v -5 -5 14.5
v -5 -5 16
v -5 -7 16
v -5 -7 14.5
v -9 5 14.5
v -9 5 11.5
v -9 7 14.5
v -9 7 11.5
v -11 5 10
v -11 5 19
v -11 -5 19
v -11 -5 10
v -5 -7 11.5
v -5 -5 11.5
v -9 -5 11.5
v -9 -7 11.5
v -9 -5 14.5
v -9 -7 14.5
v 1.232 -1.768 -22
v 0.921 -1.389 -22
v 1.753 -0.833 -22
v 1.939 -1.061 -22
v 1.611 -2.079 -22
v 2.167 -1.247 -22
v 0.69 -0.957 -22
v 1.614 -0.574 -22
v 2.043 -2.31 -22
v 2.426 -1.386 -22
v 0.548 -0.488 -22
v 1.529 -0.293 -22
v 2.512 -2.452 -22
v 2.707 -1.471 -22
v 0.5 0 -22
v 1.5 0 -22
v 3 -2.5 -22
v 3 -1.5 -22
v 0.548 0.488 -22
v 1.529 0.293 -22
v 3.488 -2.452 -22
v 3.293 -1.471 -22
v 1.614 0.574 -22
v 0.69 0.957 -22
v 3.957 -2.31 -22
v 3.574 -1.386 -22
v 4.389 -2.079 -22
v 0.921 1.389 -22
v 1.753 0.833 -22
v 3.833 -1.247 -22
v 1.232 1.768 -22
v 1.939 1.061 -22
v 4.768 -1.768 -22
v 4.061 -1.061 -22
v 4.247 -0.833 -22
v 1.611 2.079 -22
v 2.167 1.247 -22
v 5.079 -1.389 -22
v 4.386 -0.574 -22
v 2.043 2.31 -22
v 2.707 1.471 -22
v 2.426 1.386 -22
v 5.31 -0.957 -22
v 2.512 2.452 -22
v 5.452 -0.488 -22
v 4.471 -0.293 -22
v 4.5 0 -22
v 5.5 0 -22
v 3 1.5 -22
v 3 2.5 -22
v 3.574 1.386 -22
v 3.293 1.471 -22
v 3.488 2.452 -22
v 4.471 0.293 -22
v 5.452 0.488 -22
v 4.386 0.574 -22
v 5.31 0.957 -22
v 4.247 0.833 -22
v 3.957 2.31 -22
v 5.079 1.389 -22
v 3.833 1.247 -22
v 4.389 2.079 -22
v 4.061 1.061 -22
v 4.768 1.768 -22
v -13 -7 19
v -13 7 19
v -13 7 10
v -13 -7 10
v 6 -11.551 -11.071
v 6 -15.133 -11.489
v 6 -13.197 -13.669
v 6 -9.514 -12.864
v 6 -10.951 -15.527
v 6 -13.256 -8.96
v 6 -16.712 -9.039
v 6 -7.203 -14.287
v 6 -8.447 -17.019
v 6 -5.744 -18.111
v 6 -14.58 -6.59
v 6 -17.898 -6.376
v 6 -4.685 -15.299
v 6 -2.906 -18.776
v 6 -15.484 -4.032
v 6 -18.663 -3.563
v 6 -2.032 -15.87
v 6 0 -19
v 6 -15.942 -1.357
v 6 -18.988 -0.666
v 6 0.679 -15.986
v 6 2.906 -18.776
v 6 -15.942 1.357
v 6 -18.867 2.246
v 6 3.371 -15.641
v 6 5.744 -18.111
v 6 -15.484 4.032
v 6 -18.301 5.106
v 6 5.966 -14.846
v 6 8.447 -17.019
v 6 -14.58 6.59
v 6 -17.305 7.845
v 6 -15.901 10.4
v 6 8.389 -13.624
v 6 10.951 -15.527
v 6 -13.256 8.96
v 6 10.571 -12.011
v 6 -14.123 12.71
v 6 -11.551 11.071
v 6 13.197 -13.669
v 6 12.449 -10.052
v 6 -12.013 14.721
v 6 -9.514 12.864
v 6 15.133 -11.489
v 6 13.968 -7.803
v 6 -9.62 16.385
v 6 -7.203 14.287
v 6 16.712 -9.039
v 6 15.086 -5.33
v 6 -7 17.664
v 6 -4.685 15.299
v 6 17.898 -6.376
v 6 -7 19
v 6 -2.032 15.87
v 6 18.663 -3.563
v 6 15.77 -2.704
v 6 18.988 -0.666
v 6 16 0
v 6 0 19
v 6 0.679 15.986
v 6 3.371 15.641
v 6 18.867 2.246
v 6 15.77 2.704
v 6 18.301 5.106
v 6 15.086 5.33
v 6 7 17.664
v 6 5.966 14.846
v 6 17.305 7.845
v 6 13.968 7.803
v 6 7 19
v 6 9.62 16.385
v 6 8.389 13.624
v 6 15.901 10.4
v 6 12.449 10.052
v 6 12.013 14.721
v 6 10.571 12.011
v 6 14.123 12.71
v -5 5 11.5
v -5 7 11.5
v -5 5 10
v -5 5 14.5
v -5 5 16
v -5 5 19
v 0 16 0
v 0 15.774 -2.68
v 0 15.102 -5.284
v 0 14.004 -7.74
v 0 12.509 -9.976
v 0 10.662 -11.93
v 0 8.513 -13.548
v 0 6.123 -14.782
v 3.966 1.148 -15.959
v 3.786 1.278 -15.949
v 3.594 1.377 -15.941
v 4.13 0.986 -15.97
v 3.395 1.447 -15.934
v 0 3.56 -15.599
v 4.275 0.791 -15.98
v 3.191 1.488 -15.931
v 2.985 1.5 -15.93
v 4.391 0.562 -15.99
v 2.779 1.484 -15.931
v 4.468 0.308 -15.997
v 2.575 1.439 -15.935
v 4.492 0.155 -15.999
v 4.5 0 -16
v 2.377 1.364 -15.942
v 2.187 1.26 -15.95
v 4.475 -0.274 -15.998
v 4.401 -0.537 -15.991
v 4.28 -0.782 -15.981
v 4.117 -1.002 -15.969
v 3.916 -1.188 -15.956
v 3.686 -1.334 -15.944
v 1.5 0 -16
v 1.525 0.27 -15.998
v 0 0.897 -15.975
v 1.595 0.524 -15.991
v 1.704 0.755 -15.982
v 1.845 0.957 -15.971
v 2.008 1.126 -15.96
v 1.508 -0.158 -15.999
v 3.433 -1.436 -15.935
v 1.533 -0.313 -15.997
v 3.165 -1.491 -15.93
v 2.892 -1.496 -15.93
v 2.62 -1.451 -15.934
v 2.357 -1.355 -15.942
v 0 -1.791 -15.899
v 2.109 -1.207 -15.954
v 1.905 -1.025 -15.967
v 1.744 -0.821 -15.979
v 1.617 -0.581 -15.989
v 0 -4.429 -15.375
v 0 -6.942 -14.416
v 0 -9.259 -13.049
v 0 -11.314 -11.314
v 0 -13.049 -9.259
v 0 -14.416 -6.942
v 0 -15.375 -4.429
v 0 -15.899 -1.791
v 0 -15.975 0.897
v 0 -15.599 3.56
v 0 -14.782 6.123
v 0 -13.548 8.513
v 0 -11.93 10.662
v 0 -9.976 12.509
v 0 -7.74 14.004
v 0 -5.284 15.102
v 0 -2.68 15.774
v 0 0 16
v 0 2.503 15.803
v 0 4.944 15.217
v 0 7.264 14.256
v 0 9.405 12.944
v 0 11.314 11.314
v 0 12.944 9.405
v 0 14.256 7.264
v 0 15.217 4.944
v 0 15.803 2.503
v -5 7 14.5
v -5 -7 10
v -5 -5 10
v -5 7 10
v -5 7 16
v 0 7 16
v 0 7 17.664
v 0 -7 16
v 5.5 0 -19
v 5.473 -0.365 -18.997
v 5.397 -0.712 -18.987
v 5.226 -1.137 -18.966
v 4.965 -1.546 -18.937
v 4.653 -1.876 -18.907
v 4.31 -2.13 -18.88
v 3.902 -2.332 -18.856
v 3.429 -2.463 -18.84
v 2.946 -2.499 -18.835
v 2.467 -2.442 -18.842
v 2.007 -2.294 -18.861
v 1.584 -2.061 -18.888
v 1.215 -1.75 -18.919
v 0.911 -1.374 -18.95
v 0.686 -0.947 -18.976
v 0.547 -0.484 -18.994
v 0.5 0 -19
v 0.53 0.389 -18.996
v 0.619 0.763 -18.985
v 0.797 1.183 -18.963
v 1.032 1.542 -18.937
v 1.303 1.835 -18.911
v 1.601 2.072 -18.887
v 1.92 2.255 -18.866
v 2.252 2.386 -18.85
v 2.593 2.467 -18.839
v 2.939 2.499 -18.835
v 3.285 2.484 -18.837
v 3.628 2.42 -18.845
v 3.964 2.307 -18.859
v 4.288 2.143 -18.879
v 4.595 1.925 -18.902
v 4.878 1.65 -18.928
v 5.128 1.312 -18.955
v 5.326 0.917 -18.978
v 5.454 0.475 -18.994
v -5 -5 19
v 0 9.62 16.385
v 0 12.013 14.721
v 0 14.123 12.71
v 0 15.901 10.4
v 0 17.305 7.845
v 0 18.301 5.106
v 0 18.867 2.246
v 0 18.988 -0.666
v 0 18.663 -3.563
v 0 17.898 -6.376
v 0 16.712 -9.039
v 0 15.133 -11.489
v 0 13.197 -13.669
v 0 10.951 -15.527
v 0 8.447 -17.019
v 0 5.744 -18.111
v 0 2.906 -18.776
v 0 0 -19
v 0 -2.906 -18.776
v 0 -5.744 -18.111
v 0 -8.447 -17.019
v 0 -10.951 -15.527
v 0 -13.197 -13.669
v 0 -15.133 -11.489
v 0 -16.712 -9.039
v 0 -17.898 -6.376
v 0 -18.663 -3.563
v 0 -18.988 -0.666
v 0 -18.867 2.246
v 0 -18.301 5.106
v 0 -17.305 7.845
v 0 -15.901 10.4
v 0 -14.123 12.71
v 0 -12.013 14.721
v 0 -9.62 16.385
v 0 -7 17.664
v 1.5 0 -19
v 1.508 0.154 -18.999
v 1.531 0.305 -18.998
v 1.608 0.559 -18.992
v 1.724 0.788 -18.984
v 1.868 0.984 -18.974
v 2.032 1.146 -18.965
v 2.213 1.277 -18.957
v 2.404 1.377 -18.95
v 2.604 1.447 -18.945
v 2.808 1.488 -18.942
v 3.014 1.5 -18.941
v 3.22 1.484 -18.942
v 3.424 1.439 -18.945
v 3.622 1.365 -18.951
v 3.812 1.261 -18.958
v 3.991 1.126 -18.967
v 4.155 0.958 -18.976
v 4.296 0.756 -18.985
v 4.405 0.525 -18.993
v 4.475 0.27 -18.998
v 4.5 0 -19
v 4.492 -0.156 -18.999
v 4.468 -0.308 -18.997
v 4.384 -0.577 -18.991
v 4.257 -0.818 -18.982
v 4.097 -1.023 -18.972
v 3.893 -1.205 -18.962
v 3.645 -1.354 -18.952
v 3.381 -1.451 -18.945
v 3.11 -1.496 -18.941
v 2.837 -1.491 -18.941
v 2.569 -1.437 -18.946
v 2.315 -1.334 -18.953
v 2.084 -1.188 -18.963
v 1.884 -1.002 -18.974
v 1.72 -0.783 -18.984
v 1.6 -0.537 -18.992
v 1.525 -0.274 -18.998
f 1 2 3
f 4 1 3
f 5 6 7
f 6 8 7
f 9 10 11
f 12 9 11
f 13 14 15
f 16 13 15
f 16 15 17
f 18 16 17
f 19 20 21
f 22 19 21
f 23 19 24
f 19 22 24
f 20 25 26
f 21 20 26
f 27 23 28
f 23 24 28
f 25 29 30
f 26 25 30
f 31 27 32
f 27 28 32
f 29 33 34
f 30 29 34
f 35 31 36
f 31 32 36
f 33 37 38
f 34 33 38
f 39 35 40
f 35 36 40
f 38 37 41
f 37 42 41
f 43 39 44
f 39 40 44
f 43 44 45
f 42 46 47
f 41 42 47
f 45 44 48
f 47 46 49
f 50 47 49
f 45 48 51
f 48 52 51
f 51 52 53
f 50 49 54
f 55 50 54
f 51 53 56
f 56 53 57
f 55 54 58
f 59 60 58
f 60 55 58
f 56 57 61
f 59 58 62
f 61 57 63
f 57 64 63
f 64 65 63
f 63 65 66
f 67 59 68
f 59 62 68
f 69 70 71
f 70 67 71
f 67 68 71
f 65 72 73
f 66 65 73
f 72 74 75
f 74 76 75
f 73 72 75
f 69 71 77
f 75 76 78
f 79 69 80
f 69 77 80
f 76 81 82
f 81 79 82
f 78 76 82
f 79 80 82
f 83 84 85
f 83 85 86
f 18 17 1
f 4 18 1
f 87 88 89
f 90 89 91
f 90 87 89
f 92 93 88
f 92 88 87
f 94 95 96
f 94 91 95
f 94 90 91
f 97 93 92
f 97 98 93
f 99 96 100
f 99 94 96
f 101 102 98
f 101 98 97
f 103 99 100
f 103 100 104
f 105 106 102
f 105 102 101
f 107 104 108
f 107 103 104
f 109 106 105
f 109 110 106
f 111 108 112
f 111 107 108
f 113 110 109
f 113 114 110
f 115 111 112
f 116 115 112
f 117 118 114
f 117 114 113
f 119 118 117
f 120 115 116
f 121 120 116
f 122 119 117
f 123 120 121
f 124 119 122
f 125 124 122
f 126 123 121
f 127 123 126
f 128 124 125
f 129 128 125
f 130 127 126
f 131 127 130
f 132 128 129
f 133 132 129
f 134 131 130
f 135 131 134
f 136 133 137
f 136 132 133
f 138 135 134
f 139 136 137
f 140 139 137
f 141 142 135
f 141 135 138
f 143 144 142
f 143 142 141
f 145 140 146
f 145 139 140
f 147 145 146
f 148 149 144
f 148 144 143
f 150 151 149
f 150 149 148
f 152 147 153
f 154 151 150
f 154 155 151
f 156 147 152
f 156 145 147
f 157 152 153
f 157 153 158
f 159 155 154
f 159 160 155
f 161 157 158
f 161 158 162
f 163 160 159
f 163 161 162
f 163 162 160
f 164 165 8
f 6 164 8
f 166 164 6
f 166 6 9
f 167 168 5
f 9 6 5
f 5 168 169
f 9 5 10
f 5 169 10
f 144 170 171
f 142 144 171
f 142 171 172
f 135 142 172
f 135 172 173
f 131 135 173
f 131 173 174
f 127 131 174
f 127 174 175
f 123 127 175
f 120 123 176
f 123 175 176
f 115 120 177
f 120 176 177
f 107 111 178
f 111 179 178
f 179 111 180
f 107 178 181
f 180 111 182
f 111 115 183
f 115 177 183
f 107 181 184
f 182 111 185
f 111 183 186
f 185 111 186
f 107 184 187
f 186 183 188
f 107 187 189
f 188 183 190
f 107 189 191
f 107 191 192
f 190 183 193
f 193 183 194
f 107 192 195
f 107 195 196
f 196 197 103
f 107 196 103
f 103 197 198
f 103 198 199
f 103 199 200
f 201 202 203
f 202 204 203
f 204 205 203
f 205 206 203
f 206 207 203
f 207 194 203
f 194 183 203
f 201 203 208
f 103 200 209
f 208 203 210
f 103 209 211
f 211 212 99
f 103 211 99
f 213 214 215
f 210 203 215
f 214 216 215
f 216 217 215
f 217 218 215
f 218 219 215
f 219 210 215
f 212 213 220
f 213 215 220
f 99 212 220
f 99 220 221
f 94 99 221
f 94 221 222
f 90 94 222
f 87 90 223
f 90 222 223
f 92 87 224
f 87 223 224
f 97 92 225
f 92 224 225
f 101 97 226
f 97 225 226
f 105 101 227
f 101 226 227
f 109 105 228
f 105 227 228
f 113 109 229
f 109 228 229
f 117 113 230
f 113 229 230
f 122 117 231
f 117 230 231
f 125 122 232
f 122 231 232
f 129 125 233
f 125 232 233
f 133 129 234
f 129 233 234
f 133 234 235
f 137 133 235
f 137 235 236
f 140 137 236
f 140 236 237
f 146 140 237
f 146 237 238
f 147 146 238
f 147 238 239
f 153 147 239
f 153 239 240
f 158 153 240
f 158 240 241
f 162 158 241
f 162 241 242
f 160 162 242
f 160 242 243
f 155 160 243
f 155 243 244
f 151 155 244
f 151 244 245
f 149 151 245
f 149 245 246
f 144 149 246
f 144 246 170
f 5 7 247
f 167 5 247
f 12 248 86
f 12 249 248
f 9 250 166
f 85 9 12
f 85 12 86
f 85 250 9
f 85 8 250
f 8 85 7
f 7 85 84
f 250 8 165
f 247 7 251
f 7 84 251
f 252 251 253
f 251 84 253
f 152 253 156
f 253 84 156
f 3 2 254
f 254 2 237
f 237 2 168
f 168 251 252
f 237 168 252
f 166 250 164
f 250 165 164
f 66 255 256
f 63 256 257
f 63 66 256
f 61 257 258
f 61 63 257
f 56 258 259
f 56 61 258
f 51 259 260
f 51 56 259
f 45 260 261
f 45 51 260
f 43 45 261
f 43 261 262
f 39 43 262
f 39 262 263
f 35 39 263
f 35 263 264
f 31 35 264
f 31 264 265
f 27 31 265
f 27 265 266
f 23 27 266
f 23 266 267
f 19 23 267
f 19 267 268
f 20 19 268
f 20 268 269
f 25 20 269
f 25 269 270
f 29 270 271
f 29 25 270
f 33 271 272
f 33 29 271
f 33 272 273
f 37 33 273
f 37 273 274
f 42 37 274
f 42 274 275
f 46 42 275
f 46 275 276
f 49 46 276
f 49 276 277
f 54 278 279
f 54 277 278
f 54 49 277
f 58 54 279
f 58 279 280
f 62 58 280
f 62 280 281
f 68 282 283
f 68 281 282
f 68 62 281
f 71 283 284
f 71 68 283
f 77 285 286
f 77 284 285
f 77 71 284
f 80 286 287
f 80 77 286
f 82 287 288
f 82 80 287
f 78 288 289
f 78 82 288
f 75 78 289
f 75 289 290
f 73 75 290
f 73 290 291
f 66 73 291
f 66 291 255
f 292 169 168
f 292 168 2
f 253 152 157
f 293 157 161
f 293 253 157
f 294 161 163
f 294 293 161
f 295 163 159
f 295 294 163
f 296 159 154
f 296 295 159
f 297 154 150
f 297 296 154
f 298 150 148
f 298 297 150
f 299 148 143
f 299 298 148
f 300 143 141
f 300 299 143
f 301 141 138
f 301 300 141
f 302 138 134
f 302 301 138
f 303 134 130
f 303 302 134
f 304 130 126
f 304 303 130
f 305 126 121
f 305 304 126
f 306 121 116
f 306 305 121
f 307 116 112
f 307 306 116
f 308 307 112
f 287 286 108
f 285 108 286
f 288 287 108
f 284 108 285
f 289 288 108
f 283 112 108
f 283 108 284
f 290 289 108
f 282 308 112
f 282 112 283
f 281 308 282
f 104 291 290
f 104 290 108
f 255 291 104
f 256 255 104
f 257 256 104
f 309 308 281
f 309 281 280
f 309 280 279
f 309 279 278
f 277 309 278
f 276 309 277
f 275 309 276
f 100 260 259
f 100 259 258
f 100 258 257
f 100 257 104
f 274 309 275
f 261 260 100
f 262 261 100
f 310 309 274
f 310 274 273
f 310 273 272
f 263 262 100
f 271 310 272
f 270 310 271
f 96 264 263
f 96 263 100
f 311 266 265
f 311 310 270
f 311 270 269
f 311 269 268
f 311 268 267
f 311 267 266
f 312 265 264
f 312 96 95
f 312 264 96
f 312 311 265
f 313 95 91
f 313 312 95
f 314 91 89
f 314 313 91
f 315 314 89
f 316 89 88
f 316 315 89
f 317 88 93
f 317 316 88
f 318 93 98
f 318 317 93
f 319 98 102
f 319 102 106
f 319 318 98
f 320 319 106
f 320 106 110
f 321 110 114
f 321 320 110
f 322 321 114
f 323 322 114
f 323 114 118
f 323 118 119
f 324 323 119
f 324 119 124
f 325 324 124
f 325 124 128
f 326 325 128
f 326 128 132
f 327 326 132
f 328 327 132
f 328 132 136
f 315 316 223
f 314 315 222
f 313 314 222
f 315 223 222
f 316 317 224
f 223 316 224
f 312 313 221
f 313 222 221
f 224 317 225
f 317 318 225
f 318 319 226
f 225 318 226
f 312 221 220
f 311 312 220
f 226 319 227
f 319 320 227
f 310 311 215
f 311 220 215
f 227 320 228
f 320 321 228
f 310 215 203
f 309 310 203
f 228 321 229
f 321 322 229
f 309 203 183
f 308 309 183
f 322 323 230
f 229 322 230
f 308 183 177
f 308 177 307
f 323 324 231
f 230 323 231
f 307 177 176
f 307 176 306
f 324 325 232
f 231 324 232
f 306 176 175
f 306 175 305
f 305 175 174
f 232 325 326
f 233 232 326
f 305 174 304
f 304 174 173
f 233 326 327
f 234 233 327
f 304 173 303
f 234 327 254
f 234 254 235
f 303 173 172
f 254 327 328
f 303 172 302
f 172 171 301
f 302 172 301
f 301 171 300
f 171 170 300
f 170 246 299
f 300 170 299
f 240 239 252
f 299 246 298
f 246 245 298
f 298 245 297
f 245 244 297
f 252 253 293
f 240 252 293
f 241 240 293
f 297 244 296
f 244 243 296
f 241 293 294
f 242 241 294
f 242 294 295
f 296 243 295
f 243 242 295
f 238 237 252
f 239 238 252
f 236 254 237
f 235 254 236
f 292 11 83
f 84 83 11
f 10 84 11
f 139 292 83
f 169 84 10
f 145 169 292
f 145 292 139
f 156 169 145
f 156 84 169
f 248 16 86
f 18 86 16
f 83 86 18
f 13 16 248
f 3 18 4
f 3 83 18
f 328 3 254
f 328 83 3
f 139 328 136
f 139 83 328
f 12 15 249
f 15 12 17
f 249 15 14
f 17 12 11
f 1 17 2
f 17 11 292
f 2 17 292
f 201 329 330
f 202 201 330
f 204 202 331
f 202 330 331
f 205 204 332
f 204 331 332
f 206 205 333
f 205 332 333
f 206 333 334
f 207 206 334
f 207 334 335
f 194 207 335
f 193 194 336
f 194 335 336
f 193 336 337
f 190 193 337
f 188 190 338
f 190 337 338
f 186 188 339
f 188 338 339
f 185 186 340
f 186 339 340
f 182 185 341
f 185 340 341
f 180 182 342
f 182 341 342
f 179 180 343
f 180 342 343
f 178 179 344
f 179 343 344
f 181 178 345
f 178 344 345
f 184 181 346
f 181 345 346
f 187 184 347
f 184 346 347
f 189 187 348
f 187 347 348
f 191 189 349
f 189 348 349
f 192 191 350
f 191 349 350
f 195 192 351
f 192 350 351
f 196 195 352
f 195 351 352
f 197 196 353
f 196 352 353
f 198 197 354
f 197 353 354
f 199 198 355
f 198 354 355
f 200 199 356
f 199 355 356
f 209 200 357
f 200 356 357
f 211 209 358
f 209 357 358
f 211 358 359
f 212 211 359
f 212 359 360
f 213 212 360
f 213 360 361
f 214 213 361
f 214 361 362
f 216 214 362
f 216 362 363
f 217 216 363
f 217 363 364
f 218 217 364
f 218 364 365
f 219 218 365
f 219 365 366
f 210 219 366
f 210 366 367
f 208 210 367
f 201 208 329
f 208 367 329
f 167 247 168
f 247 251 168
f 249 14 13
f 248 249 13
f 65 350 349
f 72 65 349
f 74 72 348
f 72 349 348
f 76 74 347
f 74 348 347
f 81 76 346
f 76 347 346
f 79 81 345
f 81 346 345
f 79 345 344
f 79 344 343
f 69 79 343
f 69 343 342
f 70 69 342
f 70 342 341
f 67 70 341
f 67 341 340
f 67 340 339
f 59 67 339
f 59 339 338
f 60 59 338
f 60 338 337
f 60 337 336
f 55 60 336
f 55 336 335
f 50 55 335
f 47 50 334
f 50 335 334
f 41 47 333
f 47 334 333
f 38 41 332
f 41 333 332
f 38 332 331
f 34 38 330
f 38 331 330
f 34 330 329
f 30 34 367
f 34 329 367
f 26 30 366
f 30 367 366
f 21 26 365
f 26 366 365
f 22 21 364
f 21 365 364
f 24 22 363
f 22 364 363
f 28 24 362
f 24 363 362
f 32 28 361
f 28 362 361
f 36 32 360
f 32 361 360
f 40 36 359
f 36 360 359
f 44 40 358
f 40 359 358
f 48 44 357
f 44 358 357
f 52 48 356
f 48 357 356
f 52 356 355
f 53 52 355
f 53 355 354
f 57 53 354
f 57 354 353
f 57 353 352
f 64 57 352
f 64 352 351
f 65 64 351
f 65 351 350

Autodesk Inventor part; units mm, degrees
ref_plane "YZ Plane" through (0, 0, 0) normal (1, 0, 0) x (0, 1, 0)
ref_plane "XZ Plane" through (0, 0, 0) normal (0, 1, 0) x (-1, 0, 0)
sketch "Sketch1" plane through (0, 0, 0) normal (1, 0, 0) x (0, 1, 0)
  circle A0 centre (0, 0) radius 16
  circle A1 centre (0, 0) radius 19
  point P0 (19, 0)
  point P1 (0, -19)
  dimension "d0" = 32
  dimension "d1" = 3
extrude "Extrusion1" add sketch "Sketch1" along normal blind 6
ref_plane "Work Plane2" through (0, 0, 19) normal (0, 0, 1) x (1, 0, 0)
sketch "Sketch4" plane through (0, 0, 19) normal (0, 0, 1) x (1, 0, 0)
  line L0 (6, 16) -> (6, -16) projected
  line L1 (6, 7) -> (-13, 7)
  line L2 (-13, 7) -> (-13, -7)
  line L3 (-13, -7) -> (6, -7)
  line L4 (6, -7) -> (6, 7)
  line L5 (-11, 5) -> (-5, 5)
  line L6 (-5, 5) -> (-5, -5)
  line L7 (-5, -5) -> (-11, -5)
  line L8 (-11, -5) -> (-11, 5)
  point P0 (0, 0)
  point P1 (-13, 0)
  point P2 (-5, 0)
  dimension "d11" = 14
  dimension "d12" = 19
  dimension "d13" = 6
  dimension "d14" = 10
  dimension "d15" = 2
extrude "Extrusion4" add sketch "Sketch4" against normal blind 3
sketch "Sketch5" plane through (0, 0, 16) normal (0, 0, -1) x (-1, 0, 0)
  line L0 (13, 7) -> (13, -7) projected
  line L1 (13, -7) -> (-6, -7) projected
  line L2 (13, 7) -> (5, 7)
  line L3 (5, 7) -> (5, -7)
  line L4 (5, -7) -> (13, -7)
  line L5 (13, -7) -> (13, 7)
  line L6 (5, 5) -> (11, 5) projected
  line L7 (11, 5) -> (11, -5) projected
  line L8 (11, -5) -> (5, -5) projected
  point P0 (0, 0)
extrude "Extrusion5" add sketch "Sketch5" along normal blind 6 contours L0 L1 L3 L8 L7 L6 L2
sketch "Sketch6" plane through (-13, 7, 19) normal (0, 1, 0) x (1, 0, 0)
  line L0 (8, 3) -> (8, 9) projected
  line L1 (8, 7.5) -> (4, 7.5)
  line L2 (4, 7.5) -> (4, 4.5)
  line L3 (4, 4.5) -> (8, 4.5)
  line L4 (8, 4.5) -> (8, 7.5)
  line L5 (2, 0) -> (2, 9) projected
  line L6 (0, 9) -> (8, 9) projected
  point P0 (13, 19)
  dimension "d20" = 2
  dimension "d21" = 3
  dimension "d22" = 1.5
extrude "Extrusion6" cut sketch "Sketch6" against normal blind 17.25
ref_plane "Work Plane4" through (0, 0, -19) normal (0, 0, 1) x (1, 0, 0)
sketch "Sketch7" plane through (0, 0, -19) normal (0, 0, 1) x (1, 0, 0)
  circle A0 centre (3, 0) radius 1.5
  circle A1 centre (3, 0) radius 2.5
  line L0 (0, 19) -> (0, -19) projected
  point P0 (0, 0)
  point P1 (0, 0)
  point P2 (0, 7)
  point P3 (0, -7)
  dimension "d25" = 3
  dimension "d26" = 5
  dimension "d27" = 3
extrude "Extrusion7" add sketch "Sketch7" along normal mid plane 6
sketch "Sketch8" plane through (3, 0, -22) normal (0, 0, -1) x (-1, 0, 0)
  circle A0 centre (0, 0) radius 1.5 projected
  point P0 (3, 0)
extrude "Extrusion8" cut sketch "Sketch8" against normal blind 10.75
properties part number "Dc_Ring"
